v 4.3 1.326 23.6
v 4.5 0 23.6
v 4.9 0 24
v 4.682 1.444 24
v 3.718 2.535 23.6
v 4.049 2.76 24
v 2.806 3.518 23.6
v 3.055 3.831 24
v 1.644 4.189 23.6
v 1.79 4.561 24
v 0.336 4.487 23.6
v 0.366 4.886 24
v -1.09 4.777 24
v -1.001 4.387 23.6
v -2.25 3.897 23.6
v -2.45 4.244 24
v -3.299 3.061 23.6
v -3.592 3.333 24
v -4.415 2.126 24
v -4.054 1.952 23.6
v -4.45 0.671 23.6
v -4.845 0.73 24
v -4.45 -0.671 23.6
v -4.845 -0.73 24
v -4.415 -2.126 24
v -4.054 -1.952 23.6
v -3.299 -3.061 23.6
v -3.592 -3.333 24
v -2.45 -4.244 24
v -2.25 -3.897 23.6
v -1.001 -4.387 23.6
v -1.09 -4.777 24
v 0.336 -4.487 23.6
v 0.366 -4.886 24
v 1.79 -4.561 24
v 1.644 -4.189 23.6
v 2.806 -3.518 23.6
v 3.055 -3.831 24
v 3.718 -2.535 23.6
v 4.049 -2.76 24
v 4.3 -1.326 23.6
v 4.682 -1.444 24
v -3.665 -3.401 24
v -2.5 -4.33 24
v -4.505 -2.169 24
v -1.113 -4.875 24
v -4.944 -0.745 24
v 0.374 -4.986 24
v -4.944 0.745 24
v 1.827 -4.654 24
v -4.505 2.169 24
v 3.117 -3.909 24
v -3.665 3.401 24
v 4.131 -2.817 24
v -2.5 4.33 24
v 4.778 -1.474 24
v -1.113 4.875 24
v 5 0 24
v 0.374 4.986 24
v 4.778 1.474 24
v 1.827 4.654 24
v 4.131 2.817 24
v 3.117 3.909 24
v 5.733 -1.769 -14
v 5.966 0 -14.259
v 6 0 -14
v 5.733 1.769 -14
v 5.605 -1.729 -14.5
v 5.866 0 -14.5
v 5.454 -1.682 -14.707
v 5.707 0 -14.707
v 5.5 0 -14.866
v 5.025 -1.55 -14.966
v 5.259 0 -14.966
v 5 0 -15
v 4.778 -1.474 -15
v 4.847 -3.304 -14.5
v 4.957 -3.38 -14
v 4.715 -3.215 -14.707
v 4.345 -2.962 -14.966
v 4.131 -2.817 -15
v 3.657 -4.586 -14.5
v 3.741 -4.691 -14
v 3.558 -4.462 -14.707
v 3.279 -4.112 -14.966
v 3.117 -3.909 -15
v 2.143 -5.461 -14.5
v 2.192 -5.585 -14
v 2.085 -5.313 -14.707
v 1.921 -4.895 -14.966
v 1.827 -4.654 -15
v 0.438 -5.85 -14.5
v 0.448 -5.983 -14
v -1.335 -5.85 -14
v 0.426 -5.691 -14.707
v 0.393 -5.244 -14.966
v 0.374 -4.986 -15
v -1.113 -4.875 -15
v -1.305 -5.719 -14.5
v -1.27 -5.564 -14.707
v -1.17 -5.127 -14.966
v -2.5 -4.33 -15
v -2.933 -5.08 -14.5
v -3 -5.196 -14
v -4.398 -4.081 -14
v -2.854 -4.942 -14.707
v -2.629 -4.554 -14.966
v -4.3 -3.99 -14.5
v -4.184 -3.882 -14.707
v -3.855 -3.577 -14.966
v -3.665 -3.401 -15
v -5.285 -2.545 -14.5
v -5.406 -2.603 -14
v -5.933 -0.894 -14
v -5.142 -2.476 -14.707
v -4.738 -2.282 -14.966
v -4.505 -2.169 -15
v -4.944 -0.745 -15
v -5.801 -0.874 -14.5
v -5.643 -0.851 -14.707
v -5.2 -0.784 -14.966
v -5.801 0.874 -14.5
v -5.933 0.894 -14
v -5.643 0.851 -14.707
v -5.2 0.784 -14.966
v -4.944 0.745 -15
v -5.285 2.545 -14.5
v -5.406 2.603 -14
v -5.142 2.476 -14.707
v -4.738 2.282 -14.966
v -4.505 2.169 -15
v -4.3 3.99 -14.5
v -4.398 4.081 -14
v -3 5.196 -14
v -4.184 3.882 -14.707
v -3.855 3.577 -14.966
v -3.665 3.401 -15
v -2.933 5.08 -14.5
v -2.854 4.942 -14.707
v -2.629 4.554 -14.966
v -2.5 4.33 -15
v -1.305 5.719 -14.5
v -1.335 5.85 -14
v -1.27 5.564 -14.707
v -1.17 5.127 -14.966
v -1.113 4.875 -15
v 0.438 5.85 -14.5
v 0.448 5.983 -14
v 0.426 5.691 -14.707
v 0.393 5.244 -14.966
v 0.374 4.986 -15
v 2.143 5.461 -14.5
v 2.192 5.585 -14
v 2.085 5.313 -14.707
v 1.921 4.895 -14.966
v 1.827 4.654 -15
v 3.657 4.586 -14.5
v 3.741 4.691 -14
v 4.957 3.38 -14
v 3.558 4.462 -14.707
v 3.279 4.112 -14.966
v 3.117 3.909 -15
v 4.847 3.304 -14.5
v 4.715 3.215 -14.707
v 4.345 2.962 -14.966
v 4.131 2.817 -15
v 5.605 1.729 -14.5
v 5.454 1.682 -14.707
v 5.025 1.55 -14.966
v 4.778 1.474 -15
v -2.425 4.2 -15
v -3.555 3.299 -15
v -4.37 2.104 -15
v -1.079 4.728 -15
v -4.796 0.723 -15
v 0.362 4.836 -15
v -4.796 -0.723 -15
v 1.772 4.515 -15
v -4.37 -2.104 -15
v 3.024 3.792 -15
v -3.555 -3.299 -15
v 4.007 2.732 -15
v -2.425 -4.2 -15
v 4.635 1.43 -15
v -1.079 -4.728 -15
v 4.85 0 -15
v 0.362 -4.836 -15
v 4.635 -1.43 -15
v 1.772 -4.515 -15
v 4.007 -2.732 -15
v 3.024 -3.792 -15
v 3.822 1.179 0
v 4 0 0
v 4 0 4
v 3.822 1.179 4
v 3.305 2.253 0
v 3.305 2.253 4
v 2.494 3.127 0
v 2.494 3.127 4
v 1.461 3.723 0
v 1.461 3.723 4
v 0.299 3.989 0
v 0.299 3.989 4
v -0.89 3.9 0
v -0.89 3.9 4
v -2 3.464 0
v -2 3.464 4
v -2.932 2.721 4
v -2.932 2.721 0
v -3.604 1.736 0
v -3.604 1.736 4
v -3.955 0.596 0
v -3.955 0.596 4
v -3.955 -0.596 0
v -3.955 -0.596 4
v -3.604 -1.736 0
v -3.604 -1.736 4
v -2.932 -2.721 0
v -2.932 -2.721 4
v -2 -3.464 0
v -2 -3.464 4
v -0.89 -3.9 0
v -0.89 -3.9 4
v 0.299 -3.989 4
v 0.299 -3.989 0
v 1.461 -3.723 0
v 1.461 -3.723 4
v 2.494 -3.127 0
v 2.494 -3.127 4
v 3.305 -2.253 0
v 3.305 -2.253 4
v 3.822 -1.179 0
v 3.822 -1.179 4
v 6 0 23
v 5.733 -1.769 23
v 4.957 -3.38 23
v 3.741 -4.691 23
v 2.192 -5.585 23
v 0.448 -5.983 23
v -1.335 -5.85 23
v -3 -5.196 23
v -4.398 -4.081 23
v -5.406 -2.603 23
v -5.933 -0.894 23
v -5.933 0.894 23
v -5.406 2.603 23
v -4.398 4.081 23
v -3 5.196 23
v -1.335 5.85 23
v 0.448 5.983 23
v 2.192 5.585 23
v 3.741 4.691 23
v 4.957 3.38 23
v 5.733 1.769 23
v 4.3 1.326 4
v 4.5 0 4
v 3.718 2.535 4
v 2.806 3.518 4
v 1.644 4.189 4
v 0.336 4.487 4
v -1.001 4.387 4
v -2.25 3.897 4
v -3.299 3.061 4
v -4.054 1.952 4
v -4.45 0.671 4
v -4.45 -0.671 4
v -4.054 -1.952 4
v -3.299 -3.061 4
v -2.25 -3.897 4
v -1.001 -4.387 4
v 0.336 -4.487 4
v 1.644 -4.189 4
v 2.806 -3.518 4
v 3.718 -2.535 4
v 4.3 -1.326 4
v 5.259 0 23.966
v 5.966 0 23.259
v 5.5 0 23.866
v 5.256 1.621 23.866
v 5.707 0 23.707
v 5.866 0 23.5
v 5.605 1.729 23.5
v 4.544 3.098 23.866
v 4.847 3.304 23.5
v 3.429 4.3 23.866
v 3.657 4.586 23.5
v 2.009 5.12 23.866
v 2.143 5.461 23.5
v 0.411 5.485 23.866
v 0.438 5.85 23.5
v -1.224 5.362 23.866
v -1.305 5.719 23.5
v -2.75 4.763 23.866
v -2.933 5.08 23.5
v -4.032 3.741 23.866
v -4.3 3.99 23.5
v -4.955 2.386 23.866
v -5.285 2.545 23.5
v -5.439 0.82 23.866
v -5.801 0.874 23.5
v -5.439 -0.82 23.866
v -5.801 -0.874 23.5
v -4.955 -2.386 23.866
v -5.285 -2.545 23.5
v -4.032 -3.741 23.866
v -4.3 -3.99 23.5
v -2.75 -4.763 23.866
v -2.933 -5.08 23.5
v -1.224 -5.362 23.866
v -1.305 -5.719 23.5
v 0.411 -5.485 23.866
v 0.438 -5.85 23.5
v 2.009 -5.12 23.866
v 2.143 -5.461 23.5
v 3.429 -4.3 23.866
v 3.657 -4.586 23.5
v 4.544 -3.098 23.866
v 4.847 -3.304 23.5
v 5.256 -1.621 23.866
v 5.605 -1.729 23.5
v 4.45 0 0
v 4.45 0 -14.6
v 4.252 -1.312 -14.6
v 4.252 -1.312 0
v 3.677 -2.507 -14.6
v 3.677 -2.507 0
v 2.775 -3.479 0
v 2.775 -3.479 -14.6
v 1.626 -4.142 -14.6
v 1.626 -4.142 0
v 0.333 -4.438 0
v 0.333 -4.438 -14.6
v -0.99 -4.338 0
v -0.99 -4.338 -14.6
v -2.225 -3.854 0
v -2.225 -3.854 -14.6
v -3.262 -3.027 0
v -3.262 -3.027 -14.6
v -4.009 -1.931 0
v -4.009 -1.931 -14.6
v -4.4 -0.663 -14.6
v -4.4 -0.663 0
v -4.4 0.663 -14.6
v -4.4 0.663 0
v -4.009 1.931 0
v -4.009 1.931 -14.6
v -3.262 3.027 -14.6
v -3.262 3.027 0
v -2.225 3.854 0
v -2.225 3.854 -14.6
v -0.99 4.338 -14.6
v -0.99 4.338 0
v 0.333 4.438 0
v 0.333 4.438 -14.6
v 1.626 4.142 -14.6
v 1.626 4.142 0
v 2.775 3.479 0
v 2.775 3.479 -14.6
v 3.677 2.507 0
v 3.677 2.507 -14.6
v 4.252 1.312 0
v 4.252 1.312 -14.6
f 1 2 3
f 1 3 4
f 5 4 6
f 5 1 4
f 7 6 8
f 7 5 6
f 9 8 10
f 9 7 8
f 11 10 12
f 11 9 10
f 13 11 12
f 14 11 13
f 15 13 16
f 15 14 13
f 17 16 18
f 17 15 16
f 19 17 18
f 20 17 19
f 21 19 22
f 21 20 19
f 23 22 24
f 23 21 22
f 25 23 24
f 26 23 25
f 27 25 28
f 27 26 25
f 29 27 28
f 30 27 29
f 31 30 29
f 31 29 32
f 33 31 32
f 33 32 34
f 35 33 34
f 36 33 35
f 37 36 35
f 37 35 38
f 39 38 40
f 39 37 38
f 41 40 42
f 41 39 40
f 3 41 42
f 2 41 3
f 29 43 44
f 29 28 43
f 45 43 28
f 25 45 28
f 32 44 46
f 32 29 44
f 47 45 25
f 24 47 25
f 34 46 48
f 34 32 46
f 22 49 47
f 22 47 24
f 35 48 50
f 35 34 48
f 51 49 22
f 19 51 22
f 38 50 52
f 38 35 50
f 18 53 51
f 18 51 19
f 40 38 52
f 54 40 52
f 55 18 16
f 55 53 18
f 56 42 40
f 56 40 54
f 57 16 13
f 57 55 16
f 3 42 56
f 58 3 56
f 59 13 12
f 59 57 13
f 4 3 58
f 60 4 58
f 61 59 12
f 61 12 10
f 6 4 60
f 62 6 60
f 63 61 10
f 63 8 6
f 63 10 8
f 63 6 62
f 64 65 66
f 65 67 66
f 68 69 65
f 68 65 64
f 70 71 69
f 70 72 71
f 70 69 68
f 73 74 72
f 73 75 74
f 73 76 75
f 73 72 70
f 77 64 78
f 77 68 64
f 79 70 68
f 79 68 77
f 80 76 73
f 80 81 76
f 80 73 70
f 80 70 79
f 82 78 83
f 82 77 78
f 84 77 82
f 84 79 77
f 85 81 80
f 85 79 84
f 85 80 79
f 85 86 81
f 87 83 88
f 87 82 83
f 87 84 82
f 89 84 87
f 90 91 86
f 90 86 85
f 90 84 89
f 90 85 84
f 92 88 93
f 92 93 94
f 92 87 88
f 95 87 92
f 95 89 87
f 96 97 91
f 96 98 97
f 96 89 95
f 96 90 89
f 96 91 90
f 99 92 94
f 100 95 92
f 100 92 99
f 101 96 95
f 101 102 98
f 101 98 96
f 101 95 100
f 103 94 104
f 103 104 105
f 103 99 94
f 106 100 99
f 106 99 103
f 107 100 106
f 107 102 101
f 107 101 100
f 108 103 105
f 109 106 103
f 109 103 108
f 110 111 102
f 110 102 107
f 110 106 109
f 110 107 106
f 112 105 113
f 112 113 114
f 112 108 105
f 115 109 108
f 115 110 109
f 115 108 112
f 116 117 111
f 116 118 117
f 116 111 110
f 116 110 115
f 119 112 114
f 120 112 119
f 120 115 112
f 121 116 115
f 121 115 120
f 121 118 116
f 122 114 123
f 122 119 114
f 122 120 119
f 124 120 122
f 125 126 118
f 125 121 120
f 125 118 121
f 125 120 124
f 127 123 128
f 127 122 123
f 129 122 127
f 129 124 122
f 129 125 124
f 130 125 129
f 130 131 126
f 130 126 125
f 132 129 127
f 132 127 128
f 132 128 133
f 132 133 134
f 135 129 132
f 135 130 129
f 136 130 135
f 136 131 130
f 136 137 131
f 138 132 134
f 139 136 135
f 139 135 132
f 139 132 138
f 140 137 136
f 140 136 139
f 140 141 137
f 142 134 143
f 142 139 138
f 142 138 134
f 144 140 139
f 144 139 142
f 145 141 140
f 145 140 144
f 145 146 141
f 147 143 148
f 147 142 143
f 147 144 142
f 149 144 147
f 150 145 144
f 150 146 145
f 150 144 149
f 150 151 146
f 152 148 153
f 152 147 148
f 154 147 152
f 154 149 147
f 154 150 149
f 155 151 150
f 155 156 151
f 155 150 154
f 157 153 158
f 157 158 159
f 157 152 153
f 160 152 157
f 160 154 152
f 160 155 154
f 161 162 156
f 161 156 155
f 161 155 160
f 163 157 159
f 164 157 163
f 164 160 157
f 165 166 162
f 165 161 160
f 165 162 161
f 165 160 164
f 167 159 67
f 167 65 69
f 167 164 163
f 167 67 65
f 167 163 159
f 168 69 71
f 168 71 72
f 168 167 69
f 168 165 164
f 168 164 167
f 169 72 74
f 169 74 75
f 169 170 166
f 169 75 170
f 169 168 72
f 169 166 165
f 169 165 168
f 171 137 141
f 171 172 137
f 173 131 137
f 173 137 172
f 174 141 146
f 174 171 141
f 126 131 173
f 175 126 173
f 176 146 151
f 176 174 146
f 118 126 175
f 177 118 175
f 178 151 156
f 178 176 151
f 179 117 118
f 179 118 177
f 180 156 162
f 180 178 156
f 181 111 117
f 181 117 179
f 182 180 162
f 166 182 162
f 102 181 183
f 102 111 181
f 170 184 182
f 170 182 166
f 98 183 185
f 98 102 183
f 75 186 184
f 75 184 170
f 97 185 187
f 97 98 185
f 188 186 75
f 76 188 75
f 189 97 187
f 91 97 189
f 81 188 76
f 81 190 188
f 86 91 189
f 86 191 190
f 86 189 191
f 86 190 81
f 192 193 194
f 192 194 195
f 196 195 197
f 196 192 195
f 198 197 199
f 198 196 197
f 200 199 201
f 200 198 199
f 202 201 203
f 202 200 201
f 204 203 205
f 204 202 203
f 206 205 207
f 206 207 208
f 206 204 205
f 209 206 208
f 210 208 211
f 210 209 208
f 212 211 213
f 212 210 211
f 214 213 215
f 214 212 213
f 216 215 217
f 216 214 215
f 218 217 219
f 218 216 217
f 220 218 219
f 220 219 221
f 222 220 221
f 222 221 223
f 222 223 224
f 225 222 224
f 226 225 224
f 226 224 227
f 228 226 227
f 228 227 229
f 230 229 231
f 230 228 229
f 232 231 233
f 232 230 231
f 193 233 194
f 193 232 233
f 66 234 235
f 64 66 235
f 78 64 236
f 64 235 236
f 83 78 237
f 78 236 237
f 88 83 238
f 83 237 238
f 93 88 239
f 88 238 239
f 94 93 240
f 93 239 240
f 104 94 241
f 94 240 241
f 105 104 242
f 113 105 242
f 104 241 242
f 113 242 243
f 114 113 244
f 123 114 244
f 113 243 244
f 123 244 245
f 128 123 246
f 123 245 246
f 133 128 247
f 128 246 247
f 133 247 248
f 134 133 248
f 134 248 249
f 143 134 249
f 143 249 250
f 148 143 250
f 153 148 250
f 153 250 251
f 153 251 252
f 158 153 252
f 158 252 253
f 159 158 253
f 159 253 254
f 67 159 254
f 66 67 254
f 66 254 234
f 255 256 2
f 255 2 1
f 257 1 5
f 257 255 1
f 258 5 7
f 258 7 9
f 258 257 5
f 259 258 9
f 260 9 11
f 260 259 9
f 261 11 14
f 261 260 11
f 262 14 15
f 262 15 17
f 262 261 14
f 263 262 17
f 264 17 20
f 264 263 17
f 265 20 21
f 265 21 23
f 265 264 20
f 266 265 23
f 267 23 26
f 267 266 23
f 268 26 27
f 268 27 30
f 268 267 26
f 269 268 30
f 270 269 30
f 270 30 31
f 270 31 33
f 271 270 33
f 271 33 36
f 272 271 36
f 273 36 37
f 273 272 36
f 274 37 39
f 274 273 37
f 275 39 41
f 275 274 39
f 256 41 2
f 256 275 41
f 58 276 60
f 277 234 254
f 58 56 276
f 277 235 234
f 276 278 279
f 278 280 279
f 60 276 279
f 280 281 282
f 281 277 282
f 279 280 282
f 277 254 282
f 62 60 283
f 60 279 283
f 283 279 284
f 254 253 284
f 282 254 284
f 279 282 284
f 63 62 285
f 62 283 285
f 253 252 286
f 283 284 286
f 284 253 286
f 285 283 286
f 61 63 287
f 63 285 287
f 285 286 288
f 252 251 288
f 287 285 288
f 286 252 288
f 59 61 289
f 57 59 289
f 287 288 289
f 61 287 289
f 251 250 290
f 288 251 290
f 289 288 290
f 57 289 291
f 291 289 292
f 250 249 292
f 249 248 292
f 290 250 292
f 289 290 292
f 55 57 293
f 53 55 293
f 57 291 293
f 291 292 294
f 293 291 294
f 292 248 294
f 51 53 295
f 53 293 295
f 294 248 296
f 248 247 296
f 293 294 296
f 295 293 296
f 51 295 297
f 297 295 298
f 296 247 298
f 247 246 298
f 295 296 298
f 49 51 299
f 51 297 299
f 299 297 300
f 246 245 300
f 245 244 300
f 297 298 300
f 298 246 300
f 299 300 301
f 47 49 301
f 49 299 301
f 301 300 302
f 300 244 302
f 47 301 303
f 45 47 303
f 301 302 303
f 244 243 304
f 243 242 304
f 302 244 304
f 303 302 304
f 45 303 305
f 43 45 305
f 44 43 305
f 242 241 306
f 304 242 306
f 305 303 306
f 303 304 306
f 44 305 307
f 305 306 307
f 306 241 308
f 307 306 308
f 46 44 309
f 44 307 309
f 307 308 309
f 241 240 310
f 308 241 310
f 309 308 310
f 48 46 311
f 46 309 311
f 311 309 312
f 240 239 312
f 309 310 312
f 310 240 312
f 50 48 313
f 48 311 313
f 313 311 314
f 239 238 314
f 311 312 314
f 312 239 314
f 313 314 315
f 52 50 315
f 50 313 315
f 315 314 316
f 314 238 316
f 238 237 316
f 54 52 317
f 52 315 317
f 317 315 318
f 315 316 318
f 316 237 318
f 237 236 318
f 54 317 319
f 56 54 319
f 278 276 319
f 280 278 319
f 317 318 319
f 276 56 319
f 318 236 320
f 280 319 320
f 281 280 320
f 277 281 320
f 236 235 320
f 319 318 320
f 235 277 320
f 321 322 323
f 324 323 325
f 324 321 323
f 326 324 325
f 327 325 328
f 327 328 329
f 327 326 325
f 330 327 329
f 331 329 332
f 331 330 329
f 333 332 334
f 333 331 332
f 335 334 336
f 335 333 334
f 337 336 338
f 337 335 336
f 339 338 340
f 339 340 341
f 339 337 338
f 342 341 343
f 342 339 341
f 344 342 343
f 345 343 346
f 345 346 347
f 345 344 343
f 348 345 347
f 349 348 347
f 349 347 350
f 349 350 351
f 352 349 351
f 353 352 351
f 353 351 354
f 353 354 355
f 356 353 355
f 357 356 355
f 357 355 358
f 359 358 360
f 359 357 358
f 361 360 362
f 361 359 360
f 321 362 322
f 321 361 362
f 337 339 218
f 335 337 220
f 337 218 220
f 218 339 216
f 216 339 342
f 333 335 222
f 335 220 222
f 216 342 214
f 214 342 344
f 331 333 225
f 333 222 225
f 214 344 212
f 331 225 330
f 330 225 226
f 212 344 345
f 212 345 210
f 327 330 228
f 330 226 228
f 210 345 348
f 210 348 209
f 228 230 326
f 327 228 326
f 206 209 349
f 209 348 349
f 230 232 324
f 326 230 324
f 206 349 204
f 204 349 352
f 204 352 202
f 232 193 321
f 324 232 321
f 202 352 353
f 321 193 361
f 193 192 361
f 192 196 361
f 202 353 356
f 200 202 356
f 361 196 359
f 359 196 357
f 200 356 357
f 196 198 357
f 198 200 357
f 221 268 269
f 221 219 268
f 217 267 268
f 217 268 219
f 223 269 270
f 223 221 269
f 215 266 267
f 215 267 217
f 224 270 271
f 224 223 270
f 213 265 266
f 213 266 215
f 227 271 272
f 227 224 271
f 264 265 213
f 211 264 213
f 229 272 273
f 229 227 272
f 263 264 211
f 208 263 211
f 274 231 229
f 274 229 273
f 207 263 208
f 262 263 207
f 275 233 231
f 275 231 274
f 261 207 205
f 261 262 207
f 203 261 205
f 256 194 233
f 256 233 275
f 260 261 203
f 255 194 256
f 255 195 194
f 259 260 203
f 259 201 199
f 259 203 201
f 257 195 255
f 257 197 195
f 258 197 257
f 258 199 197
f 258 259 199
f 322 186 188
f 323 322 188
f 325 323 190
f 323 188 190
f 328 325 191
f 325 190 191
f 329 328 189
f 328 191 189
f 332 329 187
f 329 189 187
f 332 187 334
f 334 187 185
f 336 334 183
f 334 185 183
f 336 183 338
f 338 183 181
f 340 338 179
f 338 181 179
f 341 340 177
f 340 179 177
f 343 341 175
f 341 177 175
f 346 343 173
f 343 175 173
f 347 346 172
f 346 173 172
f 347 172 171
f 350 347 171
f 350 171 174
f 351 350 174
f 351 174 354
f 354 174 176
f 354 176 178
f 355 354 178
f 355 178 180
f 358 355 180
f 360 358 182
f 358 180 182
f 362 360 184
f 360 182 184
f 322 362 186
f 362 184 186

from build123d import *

# Parameters (mm, degrees)
F0_R     = 6
F0_R_2   = 4
F1_DEPTH = 4
F2_DEPTH = 4
F3_R     = 6
F3_R_2   = 4.5
F4_DEPTH = 20
F5_R     = 6
F5_R_2   = 4.45
F6_DEPTH = 15
F7_SIZE  = 0.4
F8_R     = 1


with BuildPart() as f1:
    # F0 (on Top) → F1 (new body)
    with BuildSketch(Plane.XY):
        Circle(F0_R)
        Circle(F0_R_2, mode=Mode.SUBTRACT)
    extrude(amount=F1_DEPTH)

    # F0 (on Top) → F2 (join)
    with BuildSketch(Plane.XY):
        Circle(F0_R)
        Circle(F0_R_2, mode=Mode.SUBTRACT)
    extrude(amount=F2_DEPTH)

    # F3 (on face) → F4 (join)
    with BuildSketch(Plane.XY.offset(4)):
        Circle(F3_R)
        Circle(F3_R_2, mode=Mode.SUBTRACT)
    extrude(amount=F4_DEPTH)

    # F5 (on face) → F6 (join)
    with BuildSketch(Plane(origin=(0, 0, 0), x_dir=(1, 0, 0), z_dir=(0, 0, -1))):
        Circle(F5_R)
        Circle(F5_R_2, mode=Mode.SUBTRACT)
    extrude(amount=F6_DEPTH)

    # F7
    f7_edges = [f1.edges().sort_by_distance(p)[0] for p in [
        (-4.45, 0, -15),
        (-4.5, 0, 24),
    ]]
    chamfer(f7_edges, length=F7_SIZE)

    # F8
    f8_edges = [f1.edges().sort_by_distance(p)[0] for p in [
        (-6, 0, 24),
        (-6, 0, -15),
    ]]
    fillet(f8_edges, radius=F8_R)


solid = f1.part
